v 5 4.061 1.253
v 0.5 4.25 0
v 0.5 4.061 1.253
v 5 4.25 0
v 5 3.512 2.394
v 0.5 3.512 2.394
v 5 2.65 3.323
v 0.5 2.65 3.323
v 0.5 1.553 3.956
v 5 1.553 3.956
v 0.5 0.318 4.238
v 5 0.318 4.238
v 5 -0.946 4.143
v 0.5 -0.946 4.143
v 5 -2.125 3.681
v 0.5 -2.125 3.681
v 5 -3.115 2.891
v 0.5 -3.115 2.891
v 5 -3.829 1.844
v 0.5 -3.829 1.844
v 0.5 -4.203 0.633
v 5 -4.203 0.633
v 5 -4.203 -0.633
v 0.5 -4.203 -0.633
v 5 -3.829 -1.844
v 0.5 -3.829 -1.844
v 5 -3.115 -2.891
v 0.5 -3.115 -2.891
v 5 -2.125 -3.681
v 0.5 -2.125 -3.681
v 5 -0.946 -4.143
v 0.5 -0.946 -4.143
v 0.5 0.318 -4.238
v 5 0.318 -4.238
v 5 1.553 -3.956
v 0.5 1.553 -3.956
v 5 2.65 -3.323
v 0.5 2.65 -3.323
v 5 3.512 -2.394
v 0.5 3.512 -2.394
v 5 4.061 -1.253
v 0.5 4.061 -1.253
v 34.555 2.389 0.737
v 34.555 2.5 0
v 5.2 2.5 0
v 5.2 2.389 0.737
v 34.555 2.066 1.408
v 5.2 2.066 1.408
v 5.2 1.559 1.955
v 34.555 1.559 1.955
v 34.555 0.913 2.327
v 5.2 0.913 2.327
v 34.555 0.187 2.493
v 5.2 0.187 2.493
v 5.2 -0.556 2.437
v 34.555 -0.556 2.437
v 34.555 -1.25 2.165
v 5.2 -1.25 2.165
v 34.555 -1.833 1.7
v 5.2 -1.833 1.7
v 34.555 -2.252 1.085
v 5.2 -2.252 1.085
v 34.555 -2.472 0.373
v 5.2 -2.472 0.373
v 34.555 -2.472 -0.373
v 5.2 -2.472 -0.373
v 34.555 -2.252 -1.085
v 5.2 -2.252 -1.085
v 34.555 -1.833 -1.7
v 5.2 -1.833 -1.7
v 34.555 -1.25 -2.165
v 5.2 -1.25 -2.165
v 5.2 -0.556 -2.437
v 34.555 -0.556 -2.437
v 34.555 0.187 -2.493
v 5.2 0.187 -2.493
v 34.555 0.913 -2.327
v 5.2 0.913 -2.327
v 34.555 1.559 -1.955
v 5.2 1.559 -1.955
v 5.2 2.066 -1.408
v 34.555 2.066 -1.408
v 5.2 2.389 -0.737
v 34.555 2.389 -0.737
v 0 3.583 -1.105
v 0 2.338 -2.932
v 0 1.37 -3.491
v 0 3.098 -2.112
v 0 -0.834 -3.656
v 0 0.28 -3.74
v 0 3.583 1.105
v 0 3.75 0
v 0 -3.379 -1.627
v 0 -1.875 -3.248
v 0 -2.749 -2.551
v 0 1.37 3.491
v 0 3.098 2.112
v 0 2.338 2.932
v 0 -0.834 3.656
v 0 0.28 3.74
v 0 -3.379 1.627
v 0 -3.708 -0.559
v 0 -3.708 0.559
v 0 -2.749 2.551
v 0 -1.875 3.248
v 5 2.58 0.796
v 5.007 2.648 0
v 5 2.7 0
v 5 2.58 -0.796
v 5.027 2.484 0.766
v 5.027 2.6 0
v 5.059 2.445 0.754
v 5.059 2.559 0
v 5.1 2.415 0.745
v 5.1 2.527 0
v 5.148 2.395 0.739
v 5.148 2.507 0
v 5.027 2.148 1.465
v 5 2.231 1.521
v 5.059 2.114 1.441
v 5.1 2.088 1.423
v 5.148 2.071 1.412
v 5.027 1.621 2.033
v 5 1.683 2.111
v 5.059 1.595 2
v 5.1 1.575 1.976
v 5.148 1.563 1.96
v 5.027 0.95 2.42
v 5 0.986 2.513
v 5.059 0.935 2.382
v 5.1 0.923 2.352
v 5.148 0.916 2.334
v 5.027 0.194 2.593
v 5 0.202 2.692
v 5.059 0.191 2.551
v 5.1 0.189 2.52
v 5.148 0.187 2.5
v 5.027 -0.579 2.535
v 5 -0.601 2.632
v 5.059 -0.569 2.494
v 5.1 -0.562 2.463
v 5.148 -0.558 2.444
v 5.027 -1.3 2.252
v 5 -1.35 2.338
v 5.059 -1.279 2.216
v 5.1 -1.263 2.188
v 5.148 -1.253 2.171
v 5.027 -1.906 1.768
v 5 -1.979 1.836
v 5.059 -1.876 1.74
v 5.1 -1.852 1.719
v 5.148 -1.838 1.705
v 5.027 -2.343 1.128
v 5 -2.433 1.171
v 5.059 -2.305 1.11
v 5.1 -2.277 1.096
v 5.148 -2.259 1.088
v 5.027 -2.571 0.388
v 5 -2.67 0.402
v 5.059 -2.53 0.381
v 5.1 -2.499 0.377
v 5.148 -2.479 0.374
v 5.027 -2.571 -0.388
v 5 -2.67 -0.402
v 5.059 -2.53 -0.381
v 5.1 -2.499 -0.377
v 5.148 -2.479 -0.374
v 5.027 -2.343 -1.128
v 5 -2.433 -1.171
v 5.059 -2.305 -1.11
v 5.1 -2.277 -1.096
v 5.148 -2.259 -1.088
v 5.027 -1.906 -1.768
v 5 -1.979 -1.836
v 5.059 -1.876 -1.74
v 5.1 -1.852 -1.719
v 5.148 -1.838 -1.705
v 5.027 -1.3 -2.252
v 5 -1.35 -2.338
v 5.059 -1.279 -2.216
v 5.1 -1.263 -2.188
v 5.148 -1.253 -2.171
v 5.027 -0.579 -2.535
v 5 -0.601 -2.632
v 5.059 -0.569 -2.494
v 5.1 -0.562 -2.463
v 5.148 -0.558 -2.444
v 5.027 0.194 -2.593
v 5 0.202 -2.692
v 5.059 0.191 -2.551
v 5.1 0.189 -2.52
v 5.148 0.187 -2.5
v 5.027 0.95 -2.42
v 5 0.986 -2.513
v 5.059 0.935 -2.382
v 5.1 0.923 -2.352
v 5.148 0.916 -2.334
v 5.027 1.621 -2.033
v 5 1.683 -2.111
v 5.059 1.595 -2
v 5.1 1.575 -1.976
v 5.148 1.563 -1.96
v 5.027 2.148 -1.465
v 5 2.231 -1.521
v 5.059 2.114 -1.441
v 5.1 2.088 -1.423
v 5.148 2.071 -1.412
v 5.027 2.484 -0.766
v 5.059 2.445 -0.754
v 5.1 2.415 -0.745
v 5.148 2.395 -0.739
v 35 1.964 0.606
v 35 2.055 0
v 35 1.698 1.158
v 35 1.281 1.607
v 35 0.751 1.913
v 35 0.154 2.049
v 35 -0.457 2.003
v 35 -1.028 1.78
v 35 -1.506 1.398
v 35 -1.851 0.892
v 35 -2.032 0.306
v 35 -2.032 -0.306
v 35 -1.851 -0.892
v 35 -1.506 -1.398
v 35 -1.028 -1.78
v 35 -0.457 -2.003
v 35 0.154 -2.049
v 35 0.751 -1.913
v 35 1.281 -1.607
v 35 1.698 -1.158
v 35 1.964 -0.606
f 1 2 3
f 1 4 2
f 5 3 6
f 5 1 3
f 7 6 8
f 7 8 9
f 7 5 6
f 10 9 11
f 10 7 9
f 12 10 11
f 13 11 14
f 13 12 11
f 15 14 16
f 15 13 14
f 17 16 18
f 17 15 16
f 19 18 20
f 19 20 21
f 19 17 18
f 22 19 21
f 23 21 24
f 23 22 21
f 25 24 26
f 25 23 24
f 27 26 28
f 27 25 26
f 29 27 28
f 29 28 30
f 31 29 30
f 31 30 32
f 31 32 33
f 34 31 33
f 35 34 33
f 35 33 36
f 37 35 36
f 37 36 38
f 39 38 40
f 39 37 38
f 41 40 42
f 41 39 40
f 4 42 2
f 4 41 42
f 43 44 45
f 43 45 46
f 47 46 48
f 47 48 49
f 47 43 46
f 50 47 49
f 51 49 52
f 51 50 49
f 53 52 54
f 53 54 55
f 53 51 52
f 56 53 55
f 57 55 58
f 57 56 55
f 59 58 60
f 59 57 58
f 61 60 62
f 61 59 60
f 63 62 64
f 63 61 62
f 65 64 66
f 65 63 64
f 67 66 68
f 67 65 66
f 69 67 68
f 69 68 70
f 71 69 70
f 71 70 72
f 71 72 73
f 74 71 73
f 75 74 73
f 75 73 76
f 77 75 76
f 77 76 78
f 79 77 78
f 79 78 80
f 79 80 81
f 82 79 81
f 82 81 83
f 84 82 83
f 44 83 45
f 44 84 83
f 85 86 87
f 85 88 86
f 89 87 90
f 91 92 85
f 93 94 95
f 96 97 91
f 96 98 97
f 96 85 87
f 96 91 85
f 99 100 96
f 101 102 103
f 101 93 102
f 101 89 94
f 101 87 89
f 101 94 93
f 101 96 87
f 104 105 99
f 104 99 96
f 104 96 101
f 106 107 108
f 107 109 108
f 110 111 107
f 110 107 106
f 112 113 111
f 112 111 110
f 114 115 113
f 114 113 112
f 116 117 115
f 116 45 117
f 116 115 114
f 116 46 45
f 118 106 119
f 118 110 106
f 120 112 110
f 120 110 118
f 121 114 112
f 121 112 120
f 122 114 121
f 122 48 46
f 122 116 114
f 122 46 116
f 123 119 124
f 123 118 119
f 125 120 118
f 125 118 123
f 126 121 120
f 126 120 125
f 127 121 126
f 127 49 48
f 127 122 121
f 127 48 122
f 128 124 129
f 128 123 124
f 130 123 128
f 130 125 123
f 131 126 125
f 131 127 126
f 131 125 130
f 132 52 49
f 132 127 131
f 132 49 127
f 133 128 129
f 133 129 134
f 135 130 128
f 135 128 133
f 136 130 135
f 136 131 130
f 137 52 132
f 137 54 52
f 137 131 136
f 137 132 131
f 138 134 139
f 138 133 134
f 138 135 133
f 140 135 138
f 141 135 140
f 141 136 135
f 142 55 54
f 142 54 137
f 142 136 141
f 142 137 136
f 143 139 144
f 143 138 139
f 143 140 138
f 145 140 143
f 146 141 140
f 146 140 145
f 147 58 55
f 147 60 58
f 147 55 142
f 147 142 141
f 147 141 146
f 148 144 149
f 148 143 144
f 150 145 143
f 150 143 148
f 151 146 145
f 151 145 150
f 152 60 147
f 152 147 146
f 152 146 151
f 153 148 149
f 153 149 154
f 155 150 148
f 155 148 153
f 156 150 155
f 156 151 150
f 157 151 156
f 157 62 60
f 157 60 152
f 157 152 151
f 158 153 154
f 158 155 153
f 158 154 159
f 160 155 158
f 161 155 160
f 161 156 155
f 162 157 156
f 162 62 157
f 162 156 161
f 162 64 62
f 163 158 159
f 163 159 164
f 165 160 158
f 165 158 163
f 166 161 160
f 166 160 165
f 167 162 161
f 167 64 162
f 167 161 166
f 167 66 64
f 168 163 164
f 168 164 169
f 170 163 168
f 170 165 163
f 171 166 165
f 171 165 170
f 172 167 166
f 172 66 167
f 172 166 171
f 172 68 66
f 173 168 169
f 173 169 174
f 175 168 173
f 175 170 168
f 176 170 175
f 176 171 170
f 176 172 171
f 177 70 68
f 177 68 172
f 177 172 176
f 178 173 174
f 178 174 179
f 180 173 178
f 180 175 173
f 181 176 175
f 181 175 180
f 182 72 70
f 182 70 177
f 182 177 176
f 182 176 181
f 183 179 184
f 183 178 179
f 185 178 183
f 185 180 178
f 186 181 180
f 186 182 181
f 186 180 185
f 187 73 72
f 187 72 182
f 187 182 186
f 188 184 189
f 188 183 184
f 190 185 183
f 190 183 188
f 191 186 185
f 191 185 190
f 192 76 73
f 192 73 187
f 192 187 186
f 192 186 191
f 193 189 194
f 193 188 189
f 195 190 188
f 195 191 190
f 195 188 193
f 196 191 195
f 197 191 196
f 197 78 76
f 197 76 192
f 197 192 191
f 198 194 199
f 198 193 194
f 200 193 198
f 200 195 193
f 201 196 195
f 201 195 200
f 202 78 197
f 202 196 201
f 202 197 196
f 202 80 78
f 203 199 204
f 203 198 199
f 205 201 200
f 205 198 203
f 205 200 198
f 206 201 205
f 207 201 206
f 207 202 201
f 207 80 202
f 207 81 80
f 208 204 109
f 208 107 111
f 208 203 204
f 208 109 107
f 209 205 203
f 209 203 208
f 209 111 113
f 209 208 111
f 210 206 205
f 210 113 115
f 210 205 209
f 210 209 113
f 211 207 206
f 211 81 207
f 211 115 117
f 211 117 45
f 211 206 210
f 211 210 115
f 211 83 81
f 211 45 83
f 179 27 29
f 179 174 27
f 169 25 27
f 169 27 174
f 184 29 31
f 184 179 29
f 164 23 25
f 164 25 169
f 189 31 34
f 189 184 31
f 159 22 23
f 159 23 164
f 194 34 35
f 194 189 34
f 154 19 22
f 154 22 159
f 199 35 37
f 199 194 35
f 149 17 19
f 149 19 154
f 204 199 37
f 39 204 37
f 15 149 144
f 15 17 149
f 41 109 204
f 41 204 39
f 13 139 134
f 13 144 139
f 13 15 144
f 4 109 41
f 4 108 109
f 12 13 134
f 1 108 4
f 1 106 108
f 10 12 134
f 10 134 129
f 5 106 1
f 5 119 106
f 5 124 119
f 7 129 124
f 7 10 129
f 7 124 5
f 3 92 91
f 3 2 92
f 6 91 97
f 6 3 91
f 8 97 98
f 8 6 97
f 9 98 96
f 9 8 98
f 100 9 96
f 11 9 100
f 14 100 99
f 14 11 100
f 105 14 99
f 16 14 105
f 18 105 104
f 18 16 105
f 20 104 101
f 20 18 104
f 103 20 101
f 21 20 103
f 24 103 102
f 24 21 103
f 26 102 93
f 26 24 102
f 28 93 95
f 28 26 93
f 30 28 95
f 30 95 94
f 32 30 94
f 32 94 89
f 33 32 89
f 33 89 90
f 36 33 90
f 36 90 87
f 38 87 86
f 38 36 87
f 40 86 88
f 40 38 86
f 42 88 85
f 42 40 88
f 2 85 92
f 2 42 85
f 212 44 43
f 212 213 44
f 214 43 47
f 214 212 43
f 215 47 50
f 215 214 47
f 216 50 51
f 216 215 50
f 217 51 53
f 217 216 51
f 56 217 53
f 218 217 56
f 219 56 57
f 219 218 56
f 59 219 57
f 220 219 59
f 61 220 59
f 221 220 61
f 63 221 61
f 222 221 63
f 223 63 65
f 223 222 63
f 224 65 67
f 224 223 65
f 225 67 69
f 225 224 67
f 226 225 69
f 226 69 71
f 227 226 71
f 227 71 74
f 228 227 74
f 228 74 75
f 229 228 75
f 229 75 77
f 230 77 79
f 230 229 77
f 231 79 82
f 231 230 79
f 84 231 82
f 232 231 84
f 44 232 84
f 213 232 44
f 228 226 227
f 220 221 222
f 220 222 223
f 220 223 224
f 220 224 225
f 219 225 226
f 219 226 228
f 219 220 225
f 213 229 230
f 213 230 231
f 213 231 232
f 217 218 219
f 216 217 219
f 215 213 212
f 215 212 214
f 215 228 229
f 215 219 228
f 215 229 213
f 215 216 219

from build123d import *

# Parameters (mm, degrees)
FILLET1_R = 0.2


with BuildPart() as part:
    # BodySke → Base-Revolve (revolve)
    with BuildSketch(Plane.XY):
        Polygon((0, 0), (0, 3.75), (0.5, 4.25), (5, 4.25), (5, 2.5), (34.555, 2.5), (35, 2.055), (35, 0), align=None)
    revolve(axis=Axis((-31.75, 0, 0), (1, 0, 0)))

    # Fillet1
    fillet1_edges = [part.edges().sort_by_distance(p)[0] for p in [
        (5, -2.5, 0),
    ]]
    fillet(fillet1_edges, radius=FILLET1_R)


solid = part.part
